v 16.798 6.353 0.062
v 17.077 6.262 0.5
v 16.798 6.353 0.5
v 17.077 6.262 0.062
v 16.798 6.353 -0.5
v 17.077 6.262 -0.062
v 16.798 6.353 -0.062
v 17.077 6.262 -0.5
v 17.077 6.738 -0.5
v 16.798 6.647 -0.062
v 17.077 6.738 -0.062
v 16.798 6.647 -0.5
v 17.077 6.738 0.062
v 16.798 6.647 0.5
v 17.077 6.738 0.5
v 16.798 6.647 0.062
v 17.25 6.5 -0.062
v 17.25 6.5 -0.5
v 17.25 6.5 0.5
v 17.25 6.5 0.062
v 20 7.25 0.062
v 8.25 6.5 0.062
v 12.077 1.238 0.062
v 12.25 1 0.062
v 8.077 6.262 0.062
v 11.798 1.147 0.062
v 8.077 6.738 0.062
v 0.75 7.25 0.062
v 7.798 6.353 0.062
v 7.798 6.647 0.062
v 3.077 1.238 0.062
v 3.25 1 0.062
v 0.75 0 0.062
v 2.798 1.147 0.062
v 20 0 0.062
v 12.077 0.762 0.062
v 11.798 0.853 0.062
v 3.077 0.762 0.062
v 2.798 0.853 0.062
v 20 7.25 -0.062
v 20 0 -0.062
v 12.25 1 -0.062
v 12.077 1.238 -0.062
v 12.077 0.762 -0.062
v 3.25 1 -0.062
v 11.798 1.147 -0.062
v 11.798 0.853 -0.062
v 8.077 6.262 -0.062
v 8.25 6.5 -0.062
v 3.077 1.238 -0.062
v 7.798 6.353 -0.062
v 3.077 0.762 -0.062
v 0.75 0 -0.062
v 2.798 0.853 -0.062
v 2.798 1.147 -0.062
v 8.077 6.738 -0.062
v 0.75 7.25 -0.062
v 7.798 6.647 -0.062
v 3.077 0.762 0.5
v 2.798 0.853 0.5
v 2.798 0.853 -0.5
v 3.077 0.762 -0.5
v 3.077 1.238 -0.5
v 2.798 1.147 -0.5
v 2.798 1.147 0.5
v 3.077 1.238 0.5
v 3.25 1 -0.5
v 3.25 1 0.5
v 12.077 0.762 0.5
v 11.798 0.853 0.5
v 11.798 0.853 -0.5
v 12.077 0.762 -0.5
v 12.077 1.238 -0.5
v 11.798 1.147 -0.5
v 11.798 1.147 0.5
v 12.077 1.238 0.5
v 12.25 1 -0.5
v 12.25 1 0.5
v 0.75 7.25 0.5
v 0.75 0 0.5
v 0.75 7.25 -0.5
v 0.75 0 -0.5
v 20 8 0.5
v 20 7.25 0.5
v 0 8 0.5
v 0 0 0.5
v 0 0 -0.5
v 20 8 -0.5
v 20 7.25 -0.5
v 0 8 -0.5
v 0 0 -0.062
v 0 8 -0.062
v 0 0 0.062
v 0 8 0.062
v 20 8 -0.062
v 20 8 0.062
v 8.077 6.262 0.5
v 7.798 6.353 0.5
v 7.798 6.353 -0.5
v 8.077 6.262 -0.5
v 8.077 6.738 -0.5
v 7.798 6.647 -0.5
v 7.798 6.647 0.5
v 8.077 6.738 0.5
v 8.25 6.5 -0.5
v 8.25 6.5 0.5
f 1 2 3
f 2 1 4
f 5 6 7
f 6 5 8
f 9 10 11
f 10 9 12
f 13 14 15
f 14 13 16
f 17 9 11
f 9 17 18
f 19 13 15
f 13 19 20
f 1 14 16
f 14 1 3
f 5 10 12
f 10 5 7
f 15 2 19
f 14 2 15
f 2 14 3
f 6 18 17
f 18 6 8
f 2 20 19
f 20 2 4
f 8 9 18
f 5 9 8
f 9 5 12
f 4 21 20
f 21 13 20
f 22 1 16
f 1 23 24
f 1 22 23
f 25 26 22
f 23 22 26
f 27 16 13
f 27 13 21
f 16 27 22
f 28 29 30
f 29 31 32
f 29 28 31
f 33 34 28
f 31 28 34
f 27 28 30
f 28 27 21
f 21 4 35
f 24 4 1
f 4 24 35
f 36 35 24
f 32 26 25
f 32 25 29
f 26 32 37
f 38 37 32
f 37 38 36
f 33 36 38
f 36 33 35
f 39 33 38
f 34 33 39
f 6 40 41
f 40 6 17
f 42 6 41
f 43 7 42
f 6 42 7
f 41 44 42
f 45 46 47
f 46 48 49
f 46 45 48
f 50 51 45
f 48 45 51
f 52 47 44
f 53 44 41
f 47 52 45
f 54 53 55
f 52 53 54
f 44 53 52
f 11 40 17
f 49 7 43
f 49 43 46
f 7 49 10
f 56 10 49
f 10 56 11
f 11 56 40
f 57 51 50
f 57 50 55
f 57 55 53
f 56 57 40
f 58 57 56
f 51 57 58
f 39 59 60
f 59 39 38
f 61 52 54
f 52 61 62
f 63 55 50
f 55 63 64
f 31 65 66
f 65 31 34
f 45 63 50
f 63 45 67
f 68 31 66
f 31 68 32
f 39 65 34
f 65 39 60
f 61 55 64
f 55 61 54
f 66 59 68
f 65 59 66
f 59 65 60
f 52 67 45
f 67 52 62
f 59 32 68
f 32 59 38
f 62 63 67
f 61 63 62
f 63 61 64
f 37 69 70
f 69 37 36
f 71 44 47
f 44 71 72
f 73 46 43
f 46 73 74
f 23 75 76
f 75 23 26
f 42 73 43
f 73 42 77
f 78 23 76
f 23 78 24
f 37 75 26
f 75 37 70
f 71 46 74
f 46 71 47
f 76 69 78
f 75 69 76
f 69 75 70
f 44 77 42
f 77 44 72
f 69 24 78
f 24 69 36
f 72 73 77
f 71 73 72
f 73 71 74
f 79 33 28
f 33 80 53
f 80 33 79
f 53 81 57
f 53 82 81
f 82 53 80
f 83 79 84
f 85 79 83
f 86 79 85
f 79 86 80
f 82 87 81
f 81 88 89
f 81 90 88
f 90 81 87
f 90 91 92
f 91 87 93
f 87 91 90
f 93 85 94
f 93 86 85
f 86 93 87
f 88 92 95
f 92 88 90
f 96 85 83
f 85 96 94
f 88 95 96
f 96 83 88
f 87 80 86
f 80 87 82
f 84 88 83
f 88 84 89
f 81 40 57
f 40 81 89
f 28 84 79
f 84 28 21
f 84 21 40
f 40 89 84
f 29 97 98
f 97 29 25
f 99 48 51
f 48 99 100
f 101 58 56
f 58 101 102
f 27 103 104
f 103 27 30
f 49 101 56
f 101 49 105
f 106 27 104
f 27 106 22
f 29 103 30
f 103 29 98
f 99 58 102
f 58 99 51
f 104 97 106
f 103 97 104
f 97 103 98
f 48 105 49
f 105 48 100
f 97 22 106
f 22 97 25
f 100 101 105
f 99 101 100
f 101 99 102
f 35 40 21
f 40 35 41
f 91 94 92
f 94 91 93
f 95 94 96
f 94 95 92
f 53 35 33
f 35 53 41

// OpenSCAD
w = 20;
h = 8;

bearing_h = 1/2;
bearing_w = 1.5;

bar_spacing = 3.5;

blx1 = 3;
bly1 = 1;

blx2 = 12;
bly2 = 1;

bbx1 = 8;
// bby1 = h - 3/4 - bearing_h;
bby1 = 6.5;

bbx2 = 17;
// bby2 = h - 3/4 - bearing_h;
bby2 = 6.5;

function bar_len() = sqrt(pow(bbx1 - blx1, 2) + pow(bby1 - bly1, 2));
function min_angle() = acos((bbx1 - blx1) / bar_len()) + 90;
function dx(angle) = 0;
function dy(angle) = 0;

function max_angle() = -45;

module bearing_pivot() {
  color("red")
  cylinder(r=1/2/2, h=1, center=true);
}

module bar() {
  color("green")
  translate([0, bar_len()/2, 0]) 
  cube(size=[1.5, bar_len(), 1/8], center=true);
}

module lid_assembly() {
  bearing_pivot();

  translate([blx2 - blx1, 0, 0]) bearing_pivot();

  color("blue")
  translate([-blx1 + 3/4 / 2, h / 2 - bly1, 0])
    cube(size=[3/4, h, 1], center=true);
  
  color("blue")
  translate([w/2 - blx1, h - 3/4 / 2 - bly1, 0]) 
    cube(size=[w, 3/4, 1], center=true);
}

angle = min_angle() - abs(max_angle() - min_angle()) * $t;

// side plate (reference rectangle)
translate([w/2, h/2, 0]) 
  cube(size=[w, h, 1/8], center=true);

translate([bbx2, bby2, 0]) {
  bearing_pivot();
  rotate([0, 0, angle]) 
  bar();
}

translate([bbx1, bby1, 0]) {
  bearing_pivot();

  rotate([0, 0, angle]) {
    bar();
    translate([0, bar_len(), 0])
      rotate([0, 0, -angle]) 
        lid_assembly();
  }
}

echo("angle", angle);
echo("bar len", bar_len());
